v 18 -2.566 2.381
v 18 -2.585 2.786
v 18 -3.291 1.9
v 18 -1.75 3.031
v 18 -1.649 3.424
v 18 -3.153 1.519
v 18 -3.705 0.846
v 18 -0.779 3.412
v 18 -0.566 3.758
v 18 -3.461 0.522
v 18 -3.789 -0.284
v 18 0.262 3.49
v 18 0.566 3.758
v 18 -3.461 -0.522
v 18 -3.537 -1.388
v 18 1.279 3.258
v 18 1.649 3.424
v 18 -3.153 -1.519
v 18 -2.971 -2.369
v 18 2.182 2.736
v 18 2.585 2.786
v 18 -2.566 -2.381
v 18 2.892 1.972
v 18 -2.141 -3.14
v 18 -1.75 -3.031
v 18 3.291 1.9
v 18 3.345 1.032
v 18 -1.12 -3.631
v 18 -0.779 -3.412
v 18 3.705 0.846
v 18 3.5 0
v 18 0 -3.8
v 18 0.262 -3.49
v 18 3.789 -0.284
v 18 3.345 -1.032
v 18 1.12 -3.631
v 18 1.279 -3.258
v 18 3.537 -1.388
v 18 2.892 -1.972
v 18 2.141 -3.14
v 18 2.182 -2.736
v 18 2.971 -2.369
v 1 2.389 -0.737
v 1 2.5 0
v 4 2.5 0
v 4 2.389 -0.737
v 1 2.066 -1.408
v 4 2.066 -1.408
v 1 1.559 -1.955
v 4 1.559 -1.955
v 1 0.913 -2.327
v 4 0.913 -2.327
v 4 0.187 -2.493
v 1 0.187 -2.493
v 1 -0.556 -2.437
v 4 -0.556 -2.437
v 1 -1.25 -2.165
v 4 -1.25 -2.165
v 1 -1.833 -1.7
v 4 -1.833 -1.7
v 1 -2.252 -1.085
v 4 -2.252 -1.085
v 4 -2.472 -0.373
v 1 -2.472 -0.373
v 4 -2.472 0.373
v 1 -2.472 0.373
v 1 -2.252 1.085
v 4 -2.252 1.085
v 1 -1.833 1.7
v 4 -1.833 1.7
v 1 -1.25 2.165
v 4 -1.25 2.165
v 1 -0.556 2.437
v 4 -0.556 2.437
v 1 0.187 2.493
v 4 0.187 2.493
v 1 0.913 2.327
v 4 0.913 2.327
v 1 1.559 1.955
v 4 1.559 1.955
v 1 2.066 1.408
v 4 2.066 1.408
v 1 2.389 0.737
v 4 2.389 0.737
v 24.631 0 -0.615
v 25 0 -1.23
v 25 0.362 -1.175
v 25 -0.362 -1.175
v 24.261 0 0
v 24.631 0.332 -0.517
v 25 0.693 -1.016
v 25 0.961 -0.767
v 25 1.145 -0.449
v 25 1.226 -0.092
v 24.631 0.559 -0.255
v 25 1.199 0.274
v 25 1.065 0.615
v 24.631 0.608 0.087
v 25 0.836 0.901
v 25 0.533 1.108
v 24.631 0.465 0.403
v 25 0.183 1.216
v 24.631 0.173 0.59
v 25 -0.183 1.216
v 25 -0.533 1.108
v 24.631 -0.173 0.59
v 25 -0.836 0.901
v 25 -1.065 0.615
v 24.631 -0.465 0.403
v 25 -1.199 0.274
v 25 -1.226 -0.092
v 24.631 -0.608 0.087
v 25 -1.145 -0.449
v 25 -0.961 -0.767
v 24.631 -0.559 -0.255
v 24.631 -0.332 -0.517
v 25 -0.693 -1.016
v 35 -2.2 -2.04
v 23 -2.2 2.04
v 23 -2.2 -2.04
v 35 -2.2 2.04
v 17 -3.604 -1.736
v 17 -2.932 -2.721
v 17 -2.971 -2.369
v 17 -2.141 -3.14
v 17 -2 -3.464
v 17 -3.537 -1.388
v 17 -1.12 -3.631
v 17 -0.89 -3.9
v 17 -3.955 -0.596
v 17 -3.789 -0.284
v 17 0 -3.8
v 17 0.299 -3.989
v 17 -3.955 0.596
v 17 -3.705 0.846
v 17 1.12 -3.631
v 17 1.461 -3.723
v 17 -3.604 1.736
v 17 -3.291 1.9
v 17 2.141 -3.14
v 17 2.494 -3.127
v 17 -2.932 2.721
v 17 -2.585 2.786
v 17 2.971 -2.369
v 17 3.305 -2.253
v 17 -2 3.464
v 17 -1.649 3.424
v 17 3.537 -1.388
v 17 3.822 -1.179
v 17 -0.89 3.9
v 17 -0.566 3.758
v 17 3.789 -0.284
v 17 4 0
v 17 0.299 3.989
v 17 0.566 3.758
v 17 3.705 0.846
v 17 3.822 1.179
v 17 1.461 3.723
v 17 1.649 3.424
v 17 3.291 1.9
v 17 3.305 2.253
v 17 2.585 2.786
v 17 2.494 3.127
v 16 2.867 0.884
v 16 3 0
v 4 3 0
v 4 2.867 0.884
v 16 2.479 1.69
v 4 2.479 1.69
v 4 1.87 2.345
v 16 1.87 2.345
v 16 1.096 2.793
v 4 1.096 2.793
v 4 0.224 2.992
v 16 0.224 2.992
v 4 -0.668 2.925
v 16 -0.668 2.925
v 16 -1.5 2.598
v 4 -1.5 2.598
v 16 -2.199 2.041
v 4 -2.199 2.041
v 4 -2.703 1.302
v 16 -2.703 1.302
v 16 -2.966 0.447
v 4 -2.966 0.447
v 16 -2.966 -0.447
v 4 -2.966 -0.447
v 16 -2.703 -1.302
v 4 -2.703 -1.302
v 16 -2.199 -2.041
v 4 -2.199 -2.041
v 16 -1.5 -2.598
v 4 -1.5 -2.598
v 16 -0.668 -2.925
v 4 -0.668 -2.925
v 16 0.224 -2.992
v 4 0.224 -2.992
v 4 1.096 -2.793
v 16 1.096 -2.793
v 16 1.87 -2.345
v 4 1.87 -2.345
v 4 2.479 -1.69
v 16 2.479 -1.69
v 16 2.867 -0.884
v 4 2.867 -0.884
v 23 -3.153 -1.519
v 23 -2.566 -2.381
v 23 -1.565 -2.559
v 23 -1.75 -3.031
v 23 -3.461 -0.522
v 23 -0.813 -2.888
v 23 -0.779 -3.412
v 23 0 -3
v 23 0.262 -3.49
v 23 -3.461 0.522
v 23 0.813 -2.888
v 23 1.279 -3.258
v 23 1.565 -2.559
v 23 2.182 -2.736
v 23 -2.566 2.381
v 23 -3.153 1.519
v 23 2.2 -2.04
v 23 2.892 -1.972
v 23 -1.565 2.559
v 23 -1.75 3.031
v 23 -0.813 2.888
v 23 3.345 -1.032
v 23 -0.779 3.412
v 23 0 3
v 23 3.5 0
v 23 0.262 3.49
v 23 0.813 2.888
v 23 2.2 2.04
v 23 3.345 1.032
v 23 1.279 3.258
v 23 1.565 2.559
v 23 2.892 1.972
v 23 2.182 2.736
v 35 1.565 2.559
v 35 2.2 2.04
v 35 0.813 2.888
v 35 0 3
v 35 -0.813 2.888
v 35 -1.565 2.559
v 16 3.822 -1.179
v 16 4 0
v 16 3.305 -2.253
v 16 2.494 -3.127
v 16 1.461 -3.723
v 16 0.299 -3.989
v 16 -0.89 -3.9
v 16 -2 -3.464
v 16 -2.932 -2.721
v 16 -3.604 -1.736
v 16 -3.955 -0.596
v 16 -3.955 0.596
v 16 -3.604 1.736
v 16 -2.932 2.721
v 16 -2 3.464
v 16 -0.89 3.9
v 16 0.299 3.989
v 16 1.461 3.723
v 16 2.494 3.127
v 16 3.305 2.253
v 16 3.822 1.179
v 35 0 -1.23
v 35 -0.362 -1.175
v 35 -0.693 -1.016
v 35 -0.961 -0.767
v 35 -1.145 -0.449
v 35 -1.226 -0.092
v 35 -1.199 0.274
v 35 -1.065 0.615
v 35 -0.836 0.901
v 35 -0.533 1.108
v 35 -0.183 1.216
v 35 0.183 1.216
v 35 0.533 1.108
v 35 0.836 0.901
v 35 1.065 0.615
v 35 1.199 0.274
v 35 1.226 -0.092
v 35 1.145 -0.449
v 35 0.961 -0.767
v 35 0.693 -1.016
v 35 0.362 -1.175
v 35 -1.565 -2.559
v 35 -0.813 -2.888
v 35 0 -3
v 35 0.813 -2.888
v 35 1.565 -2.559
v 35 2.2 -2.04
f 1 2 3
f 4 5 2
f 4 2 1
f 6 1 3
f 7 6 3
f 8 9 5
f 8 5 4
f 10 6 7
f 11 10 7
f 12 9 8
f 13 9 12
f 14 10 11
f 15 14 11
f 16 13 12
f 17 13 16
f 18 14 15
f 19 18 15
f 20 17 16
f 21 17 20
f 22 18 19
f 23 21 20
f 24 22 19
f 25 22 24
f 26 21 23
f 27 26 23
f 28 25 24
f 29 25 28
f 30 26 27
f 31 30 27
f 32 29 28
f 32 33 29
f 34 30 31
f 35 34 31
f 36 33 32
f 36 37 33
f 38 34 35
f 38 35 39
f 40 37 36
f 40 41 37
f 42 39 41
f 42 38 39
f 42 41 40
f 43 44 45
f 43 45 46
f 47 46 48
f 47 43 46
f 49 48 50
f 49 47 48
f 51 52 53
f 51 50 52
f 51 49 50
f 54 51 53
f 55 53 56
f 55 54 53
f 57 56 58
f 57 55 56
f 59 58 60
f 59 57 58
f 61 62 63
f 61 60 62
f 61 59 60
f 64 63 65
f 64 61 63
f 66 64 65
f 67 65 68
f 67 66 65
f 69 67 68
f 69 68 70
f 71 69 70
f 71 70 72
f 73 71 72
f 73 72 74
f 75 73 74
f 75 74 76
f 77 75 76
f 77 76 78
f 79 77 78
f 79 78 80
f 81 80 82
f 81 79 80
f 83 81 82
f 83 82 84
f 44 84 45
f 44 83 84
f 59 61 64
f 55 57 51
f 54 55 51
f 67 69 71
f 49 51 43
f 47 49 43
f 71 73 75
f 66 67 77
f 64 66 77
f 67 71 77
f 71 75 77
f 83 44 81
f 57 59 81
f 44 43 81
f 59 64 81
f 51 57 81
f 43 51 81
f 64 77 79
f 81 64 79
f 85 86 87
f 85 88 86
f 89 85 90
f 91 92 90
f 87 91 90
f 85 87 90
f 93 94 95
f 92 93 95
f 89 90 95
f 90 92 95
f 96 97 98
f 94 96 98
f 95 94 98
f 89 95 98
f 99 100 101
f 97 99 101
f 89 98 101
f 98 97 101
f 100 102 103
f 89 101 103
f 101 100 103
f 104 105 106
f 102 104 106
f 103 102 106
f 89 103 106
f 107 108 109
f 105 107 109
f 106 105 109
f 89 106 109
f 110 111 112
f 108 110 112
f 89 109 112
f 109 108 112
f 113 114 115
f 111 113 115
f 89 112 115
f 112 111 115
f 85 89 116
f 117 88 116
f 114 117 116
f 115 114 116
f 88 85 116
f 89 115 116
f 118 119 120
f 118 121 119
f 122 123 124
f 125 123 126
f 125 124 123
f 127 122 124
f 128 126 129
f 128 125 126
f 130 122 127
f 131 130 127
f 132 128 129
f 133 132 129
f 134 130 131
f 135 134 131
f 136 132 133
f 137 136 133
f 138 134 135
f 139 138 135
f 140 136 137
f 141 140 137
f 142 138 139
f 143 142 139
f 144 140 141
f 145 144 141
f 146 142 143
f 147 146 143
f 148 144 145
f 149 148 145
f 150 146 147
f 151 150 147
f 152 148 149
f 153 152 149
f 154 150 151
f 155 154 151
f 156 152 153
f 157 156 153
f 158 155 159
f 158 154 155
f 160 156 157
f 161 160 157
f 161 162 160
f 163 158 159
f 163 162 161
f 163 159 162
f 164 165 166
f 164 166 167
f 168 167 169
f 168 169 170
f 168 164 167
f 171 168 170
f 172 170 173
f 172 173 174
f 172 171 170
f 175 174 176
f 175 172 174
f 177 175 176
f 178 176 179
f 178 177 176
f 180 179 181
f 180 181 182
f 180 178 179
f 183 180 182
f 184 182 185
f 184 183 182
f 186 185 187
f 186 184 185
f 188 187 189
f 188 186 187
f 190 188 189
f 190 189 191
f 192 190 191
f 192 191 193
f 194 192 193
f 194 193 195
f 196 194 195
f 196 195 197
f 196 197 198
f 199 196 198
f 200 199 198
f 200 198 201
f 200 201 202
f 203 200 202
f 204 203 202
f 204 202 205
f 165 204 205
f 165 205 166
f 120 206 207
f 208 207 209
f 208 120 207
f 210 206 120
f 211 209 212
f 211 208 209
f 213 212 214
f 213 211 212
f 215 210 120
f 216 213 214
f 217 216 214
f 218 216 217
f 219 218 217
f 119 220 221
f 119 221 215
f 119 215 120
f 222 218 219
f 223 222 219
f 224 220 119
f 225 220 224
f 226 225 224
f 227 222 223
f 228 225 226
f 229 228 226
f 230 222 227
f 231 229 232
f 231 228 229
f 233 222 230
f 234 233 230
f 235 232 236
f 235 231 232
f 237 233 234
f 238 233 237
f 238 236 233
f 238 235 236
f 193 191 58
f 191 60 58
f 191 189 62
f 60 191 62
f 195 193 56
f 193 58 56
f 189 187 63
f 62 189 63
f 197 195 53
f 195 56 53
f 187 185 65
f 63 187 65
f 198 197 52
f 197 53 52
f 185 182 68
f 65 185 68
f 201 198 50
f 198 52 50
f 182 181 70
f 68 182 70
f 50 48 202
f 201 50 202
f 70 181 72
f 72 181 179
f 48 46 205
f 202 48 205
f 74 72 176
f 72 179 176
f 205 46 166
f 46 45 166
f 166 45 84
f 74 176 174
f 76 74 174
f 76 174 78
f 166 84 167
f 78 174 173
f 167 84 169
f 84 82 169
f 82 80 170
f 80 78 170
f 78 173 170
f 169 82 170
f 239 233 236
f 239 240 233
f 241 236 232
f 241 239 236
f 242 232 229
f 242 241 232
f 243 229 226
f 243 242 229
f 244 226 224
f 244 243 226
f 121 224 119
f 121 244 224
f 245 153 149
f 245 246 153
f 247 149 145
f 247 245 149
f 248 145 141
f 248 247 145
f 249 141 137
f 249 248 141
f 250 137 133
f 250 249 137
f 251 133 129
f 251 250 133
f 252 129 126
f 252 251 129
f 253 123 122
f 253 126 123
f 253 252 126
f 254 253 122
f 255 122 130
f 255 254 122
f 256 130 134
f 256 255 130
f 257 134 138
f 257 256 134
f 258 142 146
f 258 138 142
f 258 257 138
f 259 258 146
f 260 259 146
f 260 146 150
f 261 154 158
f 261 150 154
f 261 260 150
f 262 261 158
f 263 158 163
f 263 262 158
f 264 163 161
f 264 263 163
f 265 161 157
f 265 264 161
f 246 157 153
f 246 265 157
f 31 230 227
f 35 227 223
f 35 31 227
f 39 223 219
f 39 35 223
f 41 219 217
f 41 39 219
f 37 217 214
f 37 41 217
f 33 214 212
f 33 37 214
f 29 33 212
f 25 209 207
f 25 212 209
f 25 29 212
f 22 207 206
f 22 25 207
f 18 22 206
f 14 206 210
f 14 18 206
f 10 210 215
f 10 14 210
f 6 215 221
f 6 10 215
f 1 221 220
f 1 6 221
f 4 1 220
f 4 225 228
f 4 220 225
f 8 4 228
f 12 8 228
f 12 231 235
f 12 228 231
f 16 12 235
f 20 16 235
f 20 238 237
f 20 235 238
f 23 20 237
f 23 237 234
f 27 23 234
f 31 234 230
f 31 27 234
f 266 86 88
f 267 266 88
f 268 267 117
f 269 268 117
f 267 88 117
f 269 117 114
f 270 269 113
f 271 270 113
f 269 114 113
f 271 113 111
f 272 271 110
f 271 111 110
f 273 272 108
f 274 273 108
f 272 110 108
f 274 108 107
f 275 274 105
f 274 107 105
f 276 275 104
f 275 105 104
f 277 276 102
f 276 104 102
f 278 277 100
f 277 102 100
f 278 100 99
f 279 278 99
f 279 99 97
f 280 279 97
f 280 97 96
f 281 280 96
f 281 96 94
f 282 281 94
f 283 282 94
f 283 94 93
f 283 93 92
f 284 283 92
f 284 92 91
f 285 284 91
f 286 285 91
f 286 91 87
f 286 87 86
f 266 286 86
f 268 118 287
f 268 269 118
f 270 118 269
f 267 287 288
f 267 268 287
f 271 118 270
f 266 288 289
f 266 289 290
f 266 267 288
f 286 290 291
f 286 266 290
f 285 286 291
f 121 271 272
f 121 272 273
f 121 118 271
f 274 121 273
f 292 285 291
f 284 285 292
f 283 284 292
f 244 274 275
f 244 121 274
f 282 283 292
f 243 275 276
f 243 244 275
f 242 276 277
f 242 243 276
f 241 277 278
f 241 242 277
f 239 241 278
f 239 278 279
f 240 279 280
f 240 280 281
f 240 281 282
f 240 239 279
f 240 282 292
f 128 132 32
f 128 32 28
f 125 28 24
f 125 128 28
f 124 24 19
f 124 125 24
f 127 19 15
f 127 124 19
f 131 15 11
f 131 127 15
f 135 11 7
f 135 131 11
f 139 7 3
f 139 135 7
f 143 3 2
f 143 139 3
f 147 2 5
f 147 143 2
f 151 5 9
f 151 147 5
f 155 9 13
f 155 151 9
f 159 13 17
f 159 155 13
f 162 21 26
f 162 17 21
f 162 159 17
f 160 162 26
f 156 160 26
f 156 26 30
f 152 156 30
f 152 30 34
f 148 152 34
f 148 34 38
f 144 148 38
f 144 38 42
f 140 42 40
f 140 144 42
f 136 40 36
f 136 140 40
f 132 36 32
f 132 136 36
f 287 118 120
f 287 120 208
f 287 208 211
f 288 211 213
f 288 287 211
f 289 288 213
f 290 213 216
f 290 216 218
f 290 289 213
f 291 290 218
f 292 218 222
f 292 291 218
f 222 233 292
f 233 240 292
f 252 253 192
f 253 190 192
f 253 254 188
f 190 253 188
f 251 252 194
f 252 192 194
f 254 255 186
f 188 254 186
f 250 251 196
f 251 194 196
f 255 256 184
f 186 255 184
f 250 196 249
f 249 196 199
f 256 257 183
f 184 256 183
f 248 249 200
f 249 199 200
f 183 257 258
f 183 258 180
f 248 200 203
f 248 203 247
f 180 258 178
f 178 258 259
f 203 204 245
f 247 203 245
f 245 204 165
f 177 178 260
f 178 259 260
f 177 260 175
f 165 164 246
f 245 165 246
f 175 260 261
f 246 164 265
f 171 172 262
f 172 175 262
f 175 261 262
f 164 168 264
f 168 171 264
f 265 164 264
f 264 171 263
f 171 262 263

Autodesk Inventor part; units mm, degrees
ref_plane "YZ Plane" through (0, 0, 0) normal (1, 0, 0) x (0, 1, 0)
ref_plane "XZ Plane" through (0, 0, 0) normal (0, 1, 0) x (-1, 0, 0)
ref_plane "XY Plane" through (0, 0, 0) normal (0, 0, 1) x (1, 0, 0)
sketch "Sketch1" plane through (0, 0, 0) normal (0, 0, 1) x (1, 0, 0)
  line L0 (4, 3) -> (6, 3)
  line L1 (6, 3) -> (6, 3)
  line L2 (16.5, 3.5) -> (16.5, 3.5)
  line L3 (35, 3) -> (35, 0)
  line L4 (4, 3) -> (4, 2.5)
  line L5 (4, 2.5) -> (1, 2.5)
  line L6 (1, 2.5) -> (1, 0)
  line L7 (1, 0) -> (35, 0)
  line L8 (23, 3) -> (35, 3)
  line L9 (23, 3.5) -> (17, 3.5)
  line L10 (23, 3.5) -> (23, 3)
  line L11 (17, 3.5) -> (17, 4)
  line L12 (17, 4) -> (16, 4)
  line L13 (16, 4) -> (16, 3)
  line L14 (6, 3) -> (16, 3)
  point P0 (0, 0)
  dimension "d1" = 2
  dimension "d25" = 3
  dimension "d26" = 2.5
  dimension "d40" = 12
  dimension "d41" = 3
  dimension "d42" = 0.5
  dimension "d44" = 6
  dimension "d45" = 1
  dimension "d46" = 10
  dimension "d47" = 3
  dimension "d48" = 3
revolve "Revolution2" add sketch "Sketch1" angle 360 about axis through (1, 0, 0) along (1, 0, 0)
sketch "Sketch3" plane through (35, 0, 0) normal (1, 0, 0) x (0, 0, -1)
  circle A0 centre (0, 0) radius 3 projected
  line L0 (-1.6583, 2.5) -> (1.6583, 2.5)
  line L1 (-1.6583, -2.5) -> (1.6583, -2.5)
  point P0 (0, 0)
  dimension "d21" = 0.5
  dimension "d31" = 0.5
extrude "Extrusion2" [suppressed]
sketch "Sketch4" plane through (4, 0, 0) normal (-1, 0, 0) x (0, 0, 1)
  line L0 (-1.6583, 2.5) -> (1.6583, 2.5)
  circle A0 centre (0, 0) radius 3 projected
  line L1 (-1.6583, -2.5) -> (1.6583, -2.5)
  point P0 (0, 0)
  dimension "d27" = 0.5
  dimension "d30" = 0.5
extrude "Extrusion3" [suppressed]
sketch "Sketch5" plane through (35, 0, 0) normal (1, 0, 0) x (0, 0, -1)
  point P0 (0, 0)
  point P1 (0, 0)
hole "Hole1" at (35, 0, 0) direction (-1, 0, 0) diameter 2.459 depth 10 tip angle 118 thread size "M3x0.5" class "6H" standard "ISO Metric profile"
sketch "Sketch6" plane through (35, 0, 0) normal (1, 0, 0) x (0, 0, -1)
  circle A0 centre (0, 0) radius 1.2295 projected
  circle A1 centre (0, 0) radius 3 projected
  circle A2 centre (0, 0) radius 3 projected
  line L0 (-2.0396, 2.2) -> (2.0396, 2.2)
  line L1 (-2.0396, -2.2) -> (2.0396, -2.2)
  dimension "d56" = 2.2
  dimension "d57" = 2.2
extrude "Extrusion4" cut sketch "Sketch6" against normal up to surface (12 mm away) contours L0 A1 | A1 L1
sketch "Sketch7" plane through (17, 0, 0) normal (1, 0, 0) x (0, 0, -1)
  circle A0 centre (0, 0) radius 4 projected
  circle A1 centre (0, 0) radius 3.5 projected
  circle A2 centre (0, 0) radius 3.8
  point P0 (0, 0)
  dimension "d60" = 0.3
extrude "Extrusion5" add sketch "Sketch7" along normal blind 1 contours A2
equation "\"d57\" = d56"
properties part number "Wał koła" material "Aluminum 6061, Welded"
